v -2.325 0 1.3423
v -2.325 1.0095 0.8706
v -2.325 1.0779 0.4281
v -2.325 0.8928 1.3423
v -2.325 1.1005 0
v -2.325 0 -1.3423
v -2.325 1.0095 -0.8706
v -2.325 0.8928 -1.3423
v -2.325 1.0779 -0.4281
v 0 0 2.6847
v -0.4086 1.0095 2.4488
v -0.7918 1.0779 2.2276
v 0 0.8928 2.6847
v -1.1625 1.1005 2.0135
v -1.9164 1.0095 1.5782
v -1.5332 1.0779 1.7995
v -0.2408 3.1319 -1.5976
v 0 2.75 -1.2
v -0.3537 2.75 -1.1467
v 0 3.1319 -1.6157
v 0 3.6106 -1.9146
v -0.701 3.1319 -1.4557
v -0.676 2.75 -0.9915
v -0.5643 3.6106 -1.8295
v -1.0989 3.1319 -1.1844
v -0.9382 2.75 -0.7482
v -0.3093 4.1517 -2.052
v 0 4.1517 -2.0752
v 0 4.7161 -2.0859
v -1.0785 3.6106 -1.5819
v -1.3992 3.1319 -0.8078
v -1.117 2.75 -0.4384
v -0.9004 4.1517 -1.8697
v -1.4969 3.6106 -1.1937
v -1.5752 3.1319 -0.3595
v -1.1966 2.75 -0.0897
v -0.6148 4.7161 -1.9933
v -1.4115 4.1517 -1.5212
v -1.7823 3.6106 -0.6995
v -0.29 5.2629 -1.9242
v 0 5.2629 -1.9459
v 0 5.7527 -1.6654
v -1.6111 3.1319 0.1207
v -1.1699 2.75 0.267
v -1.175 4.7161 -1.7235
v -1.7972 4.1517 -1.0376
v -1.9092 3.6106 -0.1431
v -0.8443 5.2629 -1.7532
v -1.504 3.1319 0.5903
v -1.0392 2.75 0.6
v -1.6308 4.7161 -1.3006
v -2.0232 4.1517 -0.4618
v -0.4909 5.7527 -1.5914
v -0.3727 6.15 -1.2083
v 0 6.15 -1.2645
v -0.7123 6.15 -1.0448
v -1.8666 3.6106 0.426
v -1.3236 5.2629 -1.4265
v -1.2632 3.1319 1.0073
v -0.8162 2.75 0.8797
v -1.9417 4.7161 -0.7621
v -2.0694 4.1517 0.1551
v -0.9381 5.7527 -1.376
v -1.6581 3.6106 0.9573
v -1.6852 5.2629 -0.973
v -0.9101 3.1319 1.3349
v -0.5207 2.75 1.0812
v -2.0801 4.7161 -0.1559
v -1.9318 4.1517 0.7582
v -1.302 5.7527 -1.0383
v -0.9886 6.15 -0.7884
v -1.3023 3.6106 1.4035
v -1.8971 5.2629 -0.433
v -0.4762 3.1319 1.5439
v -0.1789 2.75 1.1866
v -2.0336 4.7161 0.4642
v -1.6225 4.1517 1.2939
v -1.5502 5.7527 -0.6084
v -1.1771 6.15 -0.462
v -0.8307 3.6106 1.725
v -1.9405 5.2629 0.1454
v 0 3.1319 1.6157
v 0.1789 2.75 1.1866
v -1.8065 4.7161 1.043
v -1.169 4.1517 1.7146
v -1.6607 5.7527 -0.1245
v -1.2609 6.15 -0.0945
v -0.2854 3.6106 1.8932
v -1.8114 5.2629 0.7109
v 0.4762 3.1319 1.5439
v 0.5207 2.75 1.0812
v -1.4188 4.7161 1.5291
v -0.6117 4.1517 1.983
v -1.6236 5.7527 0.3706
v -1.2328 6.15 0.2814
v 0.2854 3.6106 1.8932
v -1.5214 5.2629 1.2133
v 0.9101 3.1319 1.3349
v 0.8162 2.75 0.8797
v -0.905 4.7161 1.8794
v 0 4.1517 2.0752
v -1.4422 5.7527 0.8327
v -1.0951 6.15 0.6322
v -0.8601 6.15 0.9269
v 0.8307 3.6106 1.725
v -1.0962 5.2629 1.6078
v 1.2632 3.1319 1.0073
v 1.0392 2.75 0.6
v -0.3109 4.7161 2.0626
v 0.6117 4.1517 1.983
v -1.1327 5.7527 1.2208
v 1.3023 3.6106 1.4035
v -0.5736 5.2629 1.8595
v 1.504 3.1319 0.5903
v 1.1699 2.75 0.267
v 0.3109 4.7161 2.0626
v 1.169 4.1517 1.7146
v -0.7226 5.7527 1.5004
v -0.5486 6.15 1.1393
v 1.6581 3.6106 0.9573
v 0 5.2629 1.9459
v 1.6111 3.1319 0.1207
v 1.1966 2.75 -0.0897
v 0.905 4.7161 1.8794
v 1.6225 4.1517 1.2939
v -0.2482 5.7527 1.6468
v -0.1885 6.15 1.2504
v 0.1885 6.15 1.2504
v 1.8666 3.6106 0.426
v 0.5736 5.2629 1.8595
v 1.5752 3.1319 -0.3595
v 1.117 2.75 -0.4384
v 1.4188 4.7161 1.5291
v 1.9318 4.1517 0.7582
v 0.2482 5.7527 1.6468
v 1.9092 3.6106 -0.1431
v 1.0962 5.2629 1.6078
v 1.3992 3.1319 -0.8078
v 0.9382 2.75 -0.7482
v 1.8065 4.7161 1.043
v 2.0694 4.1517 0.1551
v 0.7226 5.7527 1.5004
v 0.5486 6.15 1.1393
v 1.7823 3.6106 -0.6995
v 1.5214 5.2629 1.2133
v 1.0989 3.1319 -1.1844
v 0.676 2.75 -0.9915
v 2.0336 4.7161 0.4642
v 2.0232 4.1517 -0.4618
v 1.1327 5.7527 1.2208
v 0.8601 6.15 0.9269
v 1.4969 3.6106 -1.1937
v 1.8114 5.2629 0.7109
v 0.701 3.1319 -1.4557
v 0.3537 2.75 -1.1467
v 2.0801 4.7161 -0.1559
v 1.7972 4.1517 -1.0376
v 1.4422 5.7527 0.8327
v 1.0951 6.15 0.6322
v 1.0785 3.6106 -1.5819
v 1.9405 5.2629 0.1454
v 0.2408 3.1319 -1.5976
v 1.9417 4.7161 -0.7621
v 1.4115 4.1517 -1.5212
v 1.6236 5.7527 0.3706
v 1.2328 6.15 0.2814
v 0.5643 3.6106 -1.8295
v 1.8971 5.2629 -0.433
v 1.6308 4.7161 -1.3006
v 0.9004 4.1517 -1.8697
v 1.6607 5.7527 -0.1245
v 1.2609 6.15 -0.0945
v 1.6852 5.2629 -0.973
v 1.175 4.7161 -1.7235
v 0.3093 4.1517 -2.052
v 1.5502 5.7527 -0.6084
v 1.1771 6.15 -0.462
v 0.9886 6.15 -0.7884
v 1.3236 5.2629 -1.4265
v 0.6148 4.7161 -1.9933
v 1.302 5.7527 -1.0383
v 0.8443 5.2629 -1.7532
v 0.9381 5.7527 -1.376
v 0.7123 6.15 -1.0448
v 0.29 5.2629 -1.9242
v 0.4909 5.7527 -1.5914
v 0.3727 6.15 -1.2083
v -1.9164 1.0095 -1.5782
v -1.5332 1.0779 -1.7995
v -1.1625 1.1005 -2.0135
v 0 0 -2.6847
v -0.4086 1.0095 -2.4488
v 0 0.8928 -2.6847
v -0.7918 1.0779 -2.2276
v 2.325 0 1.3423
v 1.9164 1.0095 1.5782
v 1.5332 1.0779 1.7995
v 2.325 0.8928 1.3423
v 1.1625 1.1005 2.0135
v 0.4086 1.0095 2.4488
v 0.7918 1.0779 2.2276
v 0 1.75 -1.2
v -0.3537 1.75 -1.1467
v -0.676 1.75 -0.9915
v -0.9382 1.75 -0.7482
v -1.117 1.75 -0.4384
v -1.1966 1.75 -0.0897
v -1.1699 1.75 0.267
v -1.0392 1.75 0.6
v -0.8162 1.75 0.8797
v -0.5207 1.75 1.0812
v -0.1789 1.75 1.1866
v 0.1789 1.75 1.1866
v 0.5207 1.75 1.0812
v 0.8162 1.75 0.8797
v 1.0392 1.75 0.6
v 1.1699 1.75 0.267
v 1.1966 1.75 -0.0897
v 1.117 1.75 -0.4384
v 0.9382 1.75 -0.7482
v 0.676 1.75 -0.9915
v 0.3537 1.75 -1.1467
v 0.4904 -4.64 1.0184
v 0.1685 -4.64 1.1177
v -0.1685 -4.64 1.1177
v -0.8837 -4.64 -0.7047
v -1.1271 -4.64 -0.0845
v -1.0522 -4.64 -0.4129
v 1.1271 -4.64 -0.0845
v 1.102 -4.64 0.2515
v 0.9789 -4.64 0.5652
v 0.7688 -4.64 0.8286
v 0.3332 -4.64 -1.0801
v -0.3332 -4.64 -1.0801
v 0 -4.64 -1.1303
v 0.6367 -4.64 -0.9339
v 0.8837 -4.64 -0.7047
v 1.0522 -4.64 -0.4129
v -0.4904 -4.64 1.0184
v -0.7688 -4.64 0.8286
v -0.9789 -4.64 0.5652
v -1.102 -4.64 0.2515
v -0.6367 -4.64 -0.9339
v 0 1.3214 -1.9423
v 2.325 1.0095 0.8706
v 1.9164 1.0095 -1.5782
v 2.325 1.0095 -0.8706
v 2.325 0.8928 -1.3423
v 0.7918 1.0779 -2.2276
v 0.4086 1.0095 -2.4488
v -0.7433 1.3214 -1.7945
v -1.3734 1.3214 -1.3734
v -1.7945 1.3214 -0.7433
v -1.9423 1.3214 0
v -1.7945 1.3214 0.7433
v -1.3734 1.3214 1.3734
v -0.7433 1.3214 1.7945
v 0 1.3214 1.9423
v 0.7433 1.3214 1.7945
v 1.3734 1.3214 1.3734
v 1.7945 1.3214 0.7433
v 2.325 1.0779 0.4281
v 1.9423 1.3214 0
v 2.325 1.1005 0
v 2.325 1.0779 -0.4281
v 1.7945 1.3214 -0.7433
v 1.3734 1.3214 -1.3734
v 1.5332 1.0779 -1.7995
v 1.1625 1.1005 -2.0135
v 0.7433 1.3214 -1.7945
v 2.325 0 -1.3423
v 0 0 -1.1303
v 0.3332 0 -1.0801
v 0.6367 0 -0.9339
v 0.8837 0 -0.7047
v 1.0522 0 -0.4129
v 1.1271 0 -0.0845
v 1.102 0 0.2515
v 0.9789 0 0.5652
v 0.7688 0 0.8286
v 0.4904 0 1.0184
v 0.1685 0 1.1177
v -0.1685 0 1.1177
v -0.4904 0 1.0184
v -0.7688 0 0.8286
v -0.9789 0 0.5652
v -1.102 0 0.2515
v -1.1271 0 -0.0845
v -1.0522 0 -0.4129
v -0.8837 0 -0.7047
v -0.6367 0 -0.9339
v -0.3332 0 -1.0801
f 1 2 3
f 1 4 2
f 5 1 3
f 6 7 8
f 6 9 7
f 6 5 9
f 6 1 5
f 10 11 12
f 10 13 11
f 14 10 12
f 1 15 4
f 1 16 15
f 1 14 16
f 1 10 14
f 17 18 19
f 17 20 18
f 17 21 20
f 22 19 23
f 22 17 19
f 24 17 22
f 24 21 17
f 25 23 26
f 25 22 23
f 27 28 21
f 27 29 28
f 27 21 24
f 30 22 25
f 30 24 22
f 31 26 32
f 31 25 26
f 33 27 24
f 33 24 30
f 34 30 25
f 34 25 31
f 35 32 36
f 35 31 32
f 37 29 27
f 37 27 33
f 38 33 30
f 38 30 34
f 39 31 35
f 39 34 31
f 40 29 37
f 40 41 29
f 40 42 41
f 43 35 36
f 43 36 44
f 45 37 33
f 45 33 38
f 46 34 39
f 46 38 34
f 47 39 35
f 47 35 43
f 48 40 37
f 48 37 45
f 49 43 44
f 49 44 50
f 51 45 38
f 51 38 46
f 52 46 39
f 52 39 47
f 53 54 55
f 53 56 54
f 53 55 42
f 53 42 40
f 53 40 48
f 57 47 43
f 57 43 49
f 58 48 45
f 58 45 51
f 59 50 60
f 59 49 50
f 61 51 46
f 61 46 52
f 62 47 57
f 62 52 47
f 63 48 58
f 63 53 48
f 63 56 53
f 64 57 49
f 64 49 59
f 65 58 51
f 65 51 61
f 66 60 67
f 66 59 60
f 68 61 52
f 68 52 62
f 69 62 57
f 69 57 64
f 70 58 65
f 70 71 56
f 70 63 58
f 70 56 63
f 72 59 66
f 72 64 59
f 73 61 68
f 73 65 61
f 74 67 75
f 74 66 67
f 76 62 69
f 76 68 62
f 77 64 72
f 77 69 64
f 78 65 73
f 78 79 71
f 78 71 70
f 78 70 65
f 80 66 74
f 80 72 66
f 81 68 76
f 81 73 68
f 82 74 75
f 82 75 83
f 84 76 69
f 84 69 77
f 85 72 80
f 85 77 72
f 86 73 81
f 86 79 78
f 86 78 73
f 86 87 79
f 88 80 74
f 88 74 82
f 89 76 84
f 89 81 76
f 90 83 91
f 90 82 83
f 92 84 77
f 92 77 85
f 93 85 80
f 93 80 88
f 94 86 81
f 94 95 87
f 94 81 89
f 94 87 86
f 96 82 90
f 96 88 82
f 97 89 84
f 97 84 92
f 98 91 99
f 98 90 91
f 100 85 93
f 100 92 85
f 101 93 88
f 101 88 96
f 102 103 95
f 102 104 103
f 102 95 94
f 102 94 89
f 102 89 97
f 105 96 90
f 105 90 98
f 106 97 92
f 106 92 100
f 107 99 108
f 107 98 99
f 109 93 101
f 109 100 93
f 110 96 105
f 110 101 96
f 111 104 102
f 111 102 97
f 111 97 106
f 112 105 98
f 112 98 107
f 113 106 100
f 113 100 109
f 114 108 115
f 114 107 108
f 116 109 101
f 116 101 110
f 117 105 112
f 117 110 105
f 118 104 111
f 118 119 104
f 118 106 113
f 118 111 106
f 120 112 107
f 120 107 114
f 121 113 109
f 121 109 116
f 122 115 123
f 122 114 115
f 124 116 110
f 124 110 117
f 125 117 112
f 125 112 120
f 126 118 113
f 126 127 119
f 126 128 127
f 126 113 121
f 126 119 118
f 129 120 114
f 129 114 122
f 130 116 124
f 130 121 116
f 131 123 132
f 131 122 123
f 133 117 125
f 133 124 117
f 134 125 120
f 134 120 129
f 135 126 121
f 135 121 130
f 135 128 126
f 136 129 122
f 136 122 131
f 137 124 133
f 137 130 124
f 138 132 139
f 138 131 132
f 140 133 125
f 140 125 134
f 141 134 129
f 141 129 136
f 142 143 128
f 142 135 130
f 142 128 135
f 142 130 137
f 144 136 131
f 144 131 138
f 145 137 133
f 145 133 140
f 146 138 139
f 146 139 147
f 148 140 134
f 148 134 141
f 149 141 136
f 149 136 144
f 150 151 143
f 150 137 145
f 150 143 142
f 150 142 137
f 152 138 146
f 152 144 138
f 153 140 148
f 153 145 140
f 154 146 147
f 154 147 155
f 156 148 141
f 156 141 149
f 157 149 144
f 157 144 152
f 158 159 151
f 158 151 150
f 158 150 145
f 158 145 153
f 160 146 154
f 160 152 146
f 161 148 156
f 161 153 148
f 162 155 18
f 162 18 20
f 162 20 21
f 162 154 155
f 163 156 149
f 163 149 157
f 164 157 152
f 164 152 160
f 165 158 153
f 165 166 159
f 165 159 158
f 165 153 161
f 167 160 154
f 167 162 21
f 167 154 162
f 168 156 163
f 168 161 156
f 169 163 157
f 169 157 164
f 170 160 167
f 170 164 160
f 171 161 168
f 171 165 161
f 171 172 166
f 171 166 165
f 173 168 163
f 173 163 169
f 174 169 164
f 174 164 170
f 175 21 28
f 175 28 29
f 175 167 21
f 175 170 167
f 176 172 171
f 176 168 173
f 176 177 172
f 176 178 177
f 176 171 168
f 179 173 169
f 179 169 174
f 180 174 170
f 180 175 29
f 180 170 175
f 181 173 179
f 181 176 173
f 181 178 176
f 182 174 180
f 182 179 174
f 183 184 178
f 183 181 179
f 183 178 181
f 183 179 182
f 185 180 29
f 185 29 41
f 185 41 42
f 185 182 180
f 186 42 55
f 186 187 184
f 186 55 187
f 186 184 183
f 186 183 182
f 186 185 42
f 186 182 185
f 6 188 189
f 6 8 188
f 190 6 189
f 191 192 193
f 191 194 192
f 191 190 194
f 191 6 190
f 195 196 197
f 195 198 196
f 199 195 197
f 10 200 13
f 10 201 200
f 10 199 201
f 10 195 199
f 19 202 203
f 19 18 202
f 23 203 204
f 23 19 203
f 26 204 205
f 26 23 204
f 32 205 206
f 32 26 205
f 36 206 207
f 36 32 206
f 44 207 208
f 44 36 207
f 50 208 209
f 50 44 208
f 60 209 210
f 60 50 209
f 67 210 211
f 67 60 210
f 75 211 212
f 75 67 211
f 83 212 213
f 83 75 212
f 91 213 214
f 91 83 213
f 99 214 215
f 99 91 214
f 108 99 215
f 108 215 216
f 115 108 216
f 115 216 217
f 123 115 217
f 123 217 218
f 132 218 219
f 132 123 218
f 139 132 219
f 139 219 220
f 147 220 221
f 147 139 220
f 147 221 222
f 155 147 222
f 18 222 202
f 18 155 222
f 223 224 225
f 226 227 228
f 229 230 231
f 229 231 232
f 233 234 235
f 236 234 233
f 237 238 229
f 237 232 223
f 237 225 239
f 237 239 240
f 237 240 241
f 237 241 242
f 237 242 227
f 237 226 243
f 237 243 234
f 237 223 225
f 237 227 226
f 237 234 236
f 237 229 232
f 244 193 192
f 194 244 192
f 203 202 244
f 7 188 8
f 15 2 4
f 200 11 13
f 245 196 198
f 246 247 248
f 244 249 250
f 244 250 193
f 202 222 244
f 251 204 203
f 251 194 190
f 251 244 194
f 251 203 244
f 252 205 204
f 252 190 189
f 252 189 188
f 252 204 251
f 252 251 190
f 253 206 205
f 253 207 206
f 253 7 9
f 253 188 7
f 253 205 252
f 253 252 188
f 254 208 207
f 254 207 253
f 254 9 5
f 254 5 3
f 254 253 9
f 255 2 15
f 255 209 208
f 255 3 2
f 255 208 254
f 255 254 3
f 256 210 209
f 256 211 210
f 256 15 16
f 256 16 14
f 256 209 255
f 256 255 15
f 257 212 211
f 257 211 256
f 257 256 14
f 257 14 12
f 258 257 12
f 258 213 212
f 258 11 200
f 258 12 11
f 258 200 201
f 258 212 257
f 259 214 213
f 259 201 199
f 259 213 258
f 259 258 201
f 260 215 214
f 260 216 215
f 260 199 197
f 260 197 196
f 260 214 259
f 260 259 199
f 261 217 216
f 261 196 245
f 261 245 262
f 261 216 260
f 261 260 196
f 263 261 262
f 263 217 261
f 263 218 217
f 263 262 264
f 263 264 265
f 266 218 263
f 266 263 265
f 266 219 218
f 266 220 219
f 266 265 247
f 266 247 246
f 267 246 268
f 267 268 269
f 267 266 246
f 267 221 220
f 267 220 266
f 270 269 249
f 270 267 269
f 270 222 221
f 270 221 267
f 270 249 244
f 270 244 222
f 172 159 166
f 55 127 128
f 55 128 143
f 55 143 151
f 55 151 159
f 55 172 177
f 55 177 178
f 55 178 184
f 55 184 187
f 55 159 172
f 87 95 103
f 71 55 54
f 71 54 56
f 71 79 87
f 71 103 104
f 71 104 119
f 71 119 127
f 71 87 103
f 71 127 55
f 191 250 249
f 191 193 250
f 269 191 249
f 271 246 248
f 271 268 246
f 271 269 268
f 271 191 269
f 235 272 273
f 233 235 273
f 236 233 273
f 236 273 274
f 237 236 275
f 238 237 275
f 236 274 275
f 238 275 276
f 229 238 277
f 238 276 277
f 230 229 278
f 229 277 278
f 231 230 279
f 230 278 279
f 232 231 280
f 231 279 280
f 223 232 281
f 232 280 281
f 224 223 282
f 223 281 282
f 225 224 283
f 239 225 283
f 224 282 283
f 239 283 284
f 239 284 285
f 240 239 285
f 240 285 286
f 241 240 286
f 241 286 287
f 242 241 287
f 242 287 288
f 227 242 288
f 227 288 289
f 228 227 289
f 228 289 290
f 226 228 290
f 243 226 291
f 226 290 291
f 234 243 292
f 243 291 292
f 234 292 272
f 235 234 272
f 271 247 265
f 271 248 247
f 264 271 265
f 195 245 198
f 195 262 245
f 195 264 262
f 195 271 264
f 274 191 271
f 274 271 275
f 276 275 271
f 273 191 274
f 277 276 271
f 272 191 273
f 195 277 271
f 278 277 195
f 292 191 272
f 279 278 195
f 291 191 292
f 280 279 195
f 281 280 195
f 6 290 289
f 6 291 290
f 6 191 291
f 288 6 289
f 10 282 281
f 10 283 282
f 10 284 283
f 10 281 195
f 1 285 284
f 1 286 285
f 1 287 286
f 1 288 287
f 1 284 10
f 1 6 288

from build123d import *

# Parameters (mm, degrees)
SKETCH2_OUTSIDE_W   = 13.154
SKETCH2_OUTSIDE_H   = 13.154
CUT_EXTRUDE1_DEPTH  = 9.580601773
SKETCH3_R           = 1.1303
BOSS_EXTRUDE1_DEPTH = 4.64


with BuildPart() as part:
    # Sketch1 → Revolve1 (revolve)
    with BuildSketch(Plane.XY, mode=Mode.PRIVATE) as revolve1_sk:
        with BuildLine():
            Line((4.231088913, 0), (1.2, 1.75))
            Line((1.2, 1.75), (1.2, 2.75))
            ThreePointArc((1.2, 2.75), (2.099622467, 4.433550528), (1.26447926, 6.15))
            Line((1.26447926, 6.15), (0, 6.15))
            Line((0, 6.15), (0, 0))
            Line((0, 0), (4.231088913, 0))
        make_face()
    revolve(revolve1_sk.sketch.rotate(Axis((0, 0, 0), (0, 1, 0)), 90), axis=Axis((0, 0, 0), (0, 1, 0)))

    # Sketch2 outside → Cut-Extrude1 (cut, through all)
    with BuildSketch(Plane.XZ):
        Rectangle(SKETCH2_OUTSIDE_W, SKETCH2_OUTSIDE_H)
        Polygon((0, 2.684678752), (-2.325, 1.342339376), (-2.325, -1.342339376), (0, -2.684678752), (2.325, -1.342339376), (2.325, 1.342339376), align=None, mode=Mode.SUBTRACT)
    extrude(amount=-CUT_EXTRUDE1_DEPTH, mode=Mode.SUBTRACT)

    # Sketch3 → Boss-Extrude1 (add)
    with BuildSketch(Plane.XZ):
        with Locations(Location((0, 0, 0), (0, 0, 270))):
            Circle(SKETCH3_R)
    extrude(amount=BOSS_EXTRUDE1_DEPTH)


solid = part.part
